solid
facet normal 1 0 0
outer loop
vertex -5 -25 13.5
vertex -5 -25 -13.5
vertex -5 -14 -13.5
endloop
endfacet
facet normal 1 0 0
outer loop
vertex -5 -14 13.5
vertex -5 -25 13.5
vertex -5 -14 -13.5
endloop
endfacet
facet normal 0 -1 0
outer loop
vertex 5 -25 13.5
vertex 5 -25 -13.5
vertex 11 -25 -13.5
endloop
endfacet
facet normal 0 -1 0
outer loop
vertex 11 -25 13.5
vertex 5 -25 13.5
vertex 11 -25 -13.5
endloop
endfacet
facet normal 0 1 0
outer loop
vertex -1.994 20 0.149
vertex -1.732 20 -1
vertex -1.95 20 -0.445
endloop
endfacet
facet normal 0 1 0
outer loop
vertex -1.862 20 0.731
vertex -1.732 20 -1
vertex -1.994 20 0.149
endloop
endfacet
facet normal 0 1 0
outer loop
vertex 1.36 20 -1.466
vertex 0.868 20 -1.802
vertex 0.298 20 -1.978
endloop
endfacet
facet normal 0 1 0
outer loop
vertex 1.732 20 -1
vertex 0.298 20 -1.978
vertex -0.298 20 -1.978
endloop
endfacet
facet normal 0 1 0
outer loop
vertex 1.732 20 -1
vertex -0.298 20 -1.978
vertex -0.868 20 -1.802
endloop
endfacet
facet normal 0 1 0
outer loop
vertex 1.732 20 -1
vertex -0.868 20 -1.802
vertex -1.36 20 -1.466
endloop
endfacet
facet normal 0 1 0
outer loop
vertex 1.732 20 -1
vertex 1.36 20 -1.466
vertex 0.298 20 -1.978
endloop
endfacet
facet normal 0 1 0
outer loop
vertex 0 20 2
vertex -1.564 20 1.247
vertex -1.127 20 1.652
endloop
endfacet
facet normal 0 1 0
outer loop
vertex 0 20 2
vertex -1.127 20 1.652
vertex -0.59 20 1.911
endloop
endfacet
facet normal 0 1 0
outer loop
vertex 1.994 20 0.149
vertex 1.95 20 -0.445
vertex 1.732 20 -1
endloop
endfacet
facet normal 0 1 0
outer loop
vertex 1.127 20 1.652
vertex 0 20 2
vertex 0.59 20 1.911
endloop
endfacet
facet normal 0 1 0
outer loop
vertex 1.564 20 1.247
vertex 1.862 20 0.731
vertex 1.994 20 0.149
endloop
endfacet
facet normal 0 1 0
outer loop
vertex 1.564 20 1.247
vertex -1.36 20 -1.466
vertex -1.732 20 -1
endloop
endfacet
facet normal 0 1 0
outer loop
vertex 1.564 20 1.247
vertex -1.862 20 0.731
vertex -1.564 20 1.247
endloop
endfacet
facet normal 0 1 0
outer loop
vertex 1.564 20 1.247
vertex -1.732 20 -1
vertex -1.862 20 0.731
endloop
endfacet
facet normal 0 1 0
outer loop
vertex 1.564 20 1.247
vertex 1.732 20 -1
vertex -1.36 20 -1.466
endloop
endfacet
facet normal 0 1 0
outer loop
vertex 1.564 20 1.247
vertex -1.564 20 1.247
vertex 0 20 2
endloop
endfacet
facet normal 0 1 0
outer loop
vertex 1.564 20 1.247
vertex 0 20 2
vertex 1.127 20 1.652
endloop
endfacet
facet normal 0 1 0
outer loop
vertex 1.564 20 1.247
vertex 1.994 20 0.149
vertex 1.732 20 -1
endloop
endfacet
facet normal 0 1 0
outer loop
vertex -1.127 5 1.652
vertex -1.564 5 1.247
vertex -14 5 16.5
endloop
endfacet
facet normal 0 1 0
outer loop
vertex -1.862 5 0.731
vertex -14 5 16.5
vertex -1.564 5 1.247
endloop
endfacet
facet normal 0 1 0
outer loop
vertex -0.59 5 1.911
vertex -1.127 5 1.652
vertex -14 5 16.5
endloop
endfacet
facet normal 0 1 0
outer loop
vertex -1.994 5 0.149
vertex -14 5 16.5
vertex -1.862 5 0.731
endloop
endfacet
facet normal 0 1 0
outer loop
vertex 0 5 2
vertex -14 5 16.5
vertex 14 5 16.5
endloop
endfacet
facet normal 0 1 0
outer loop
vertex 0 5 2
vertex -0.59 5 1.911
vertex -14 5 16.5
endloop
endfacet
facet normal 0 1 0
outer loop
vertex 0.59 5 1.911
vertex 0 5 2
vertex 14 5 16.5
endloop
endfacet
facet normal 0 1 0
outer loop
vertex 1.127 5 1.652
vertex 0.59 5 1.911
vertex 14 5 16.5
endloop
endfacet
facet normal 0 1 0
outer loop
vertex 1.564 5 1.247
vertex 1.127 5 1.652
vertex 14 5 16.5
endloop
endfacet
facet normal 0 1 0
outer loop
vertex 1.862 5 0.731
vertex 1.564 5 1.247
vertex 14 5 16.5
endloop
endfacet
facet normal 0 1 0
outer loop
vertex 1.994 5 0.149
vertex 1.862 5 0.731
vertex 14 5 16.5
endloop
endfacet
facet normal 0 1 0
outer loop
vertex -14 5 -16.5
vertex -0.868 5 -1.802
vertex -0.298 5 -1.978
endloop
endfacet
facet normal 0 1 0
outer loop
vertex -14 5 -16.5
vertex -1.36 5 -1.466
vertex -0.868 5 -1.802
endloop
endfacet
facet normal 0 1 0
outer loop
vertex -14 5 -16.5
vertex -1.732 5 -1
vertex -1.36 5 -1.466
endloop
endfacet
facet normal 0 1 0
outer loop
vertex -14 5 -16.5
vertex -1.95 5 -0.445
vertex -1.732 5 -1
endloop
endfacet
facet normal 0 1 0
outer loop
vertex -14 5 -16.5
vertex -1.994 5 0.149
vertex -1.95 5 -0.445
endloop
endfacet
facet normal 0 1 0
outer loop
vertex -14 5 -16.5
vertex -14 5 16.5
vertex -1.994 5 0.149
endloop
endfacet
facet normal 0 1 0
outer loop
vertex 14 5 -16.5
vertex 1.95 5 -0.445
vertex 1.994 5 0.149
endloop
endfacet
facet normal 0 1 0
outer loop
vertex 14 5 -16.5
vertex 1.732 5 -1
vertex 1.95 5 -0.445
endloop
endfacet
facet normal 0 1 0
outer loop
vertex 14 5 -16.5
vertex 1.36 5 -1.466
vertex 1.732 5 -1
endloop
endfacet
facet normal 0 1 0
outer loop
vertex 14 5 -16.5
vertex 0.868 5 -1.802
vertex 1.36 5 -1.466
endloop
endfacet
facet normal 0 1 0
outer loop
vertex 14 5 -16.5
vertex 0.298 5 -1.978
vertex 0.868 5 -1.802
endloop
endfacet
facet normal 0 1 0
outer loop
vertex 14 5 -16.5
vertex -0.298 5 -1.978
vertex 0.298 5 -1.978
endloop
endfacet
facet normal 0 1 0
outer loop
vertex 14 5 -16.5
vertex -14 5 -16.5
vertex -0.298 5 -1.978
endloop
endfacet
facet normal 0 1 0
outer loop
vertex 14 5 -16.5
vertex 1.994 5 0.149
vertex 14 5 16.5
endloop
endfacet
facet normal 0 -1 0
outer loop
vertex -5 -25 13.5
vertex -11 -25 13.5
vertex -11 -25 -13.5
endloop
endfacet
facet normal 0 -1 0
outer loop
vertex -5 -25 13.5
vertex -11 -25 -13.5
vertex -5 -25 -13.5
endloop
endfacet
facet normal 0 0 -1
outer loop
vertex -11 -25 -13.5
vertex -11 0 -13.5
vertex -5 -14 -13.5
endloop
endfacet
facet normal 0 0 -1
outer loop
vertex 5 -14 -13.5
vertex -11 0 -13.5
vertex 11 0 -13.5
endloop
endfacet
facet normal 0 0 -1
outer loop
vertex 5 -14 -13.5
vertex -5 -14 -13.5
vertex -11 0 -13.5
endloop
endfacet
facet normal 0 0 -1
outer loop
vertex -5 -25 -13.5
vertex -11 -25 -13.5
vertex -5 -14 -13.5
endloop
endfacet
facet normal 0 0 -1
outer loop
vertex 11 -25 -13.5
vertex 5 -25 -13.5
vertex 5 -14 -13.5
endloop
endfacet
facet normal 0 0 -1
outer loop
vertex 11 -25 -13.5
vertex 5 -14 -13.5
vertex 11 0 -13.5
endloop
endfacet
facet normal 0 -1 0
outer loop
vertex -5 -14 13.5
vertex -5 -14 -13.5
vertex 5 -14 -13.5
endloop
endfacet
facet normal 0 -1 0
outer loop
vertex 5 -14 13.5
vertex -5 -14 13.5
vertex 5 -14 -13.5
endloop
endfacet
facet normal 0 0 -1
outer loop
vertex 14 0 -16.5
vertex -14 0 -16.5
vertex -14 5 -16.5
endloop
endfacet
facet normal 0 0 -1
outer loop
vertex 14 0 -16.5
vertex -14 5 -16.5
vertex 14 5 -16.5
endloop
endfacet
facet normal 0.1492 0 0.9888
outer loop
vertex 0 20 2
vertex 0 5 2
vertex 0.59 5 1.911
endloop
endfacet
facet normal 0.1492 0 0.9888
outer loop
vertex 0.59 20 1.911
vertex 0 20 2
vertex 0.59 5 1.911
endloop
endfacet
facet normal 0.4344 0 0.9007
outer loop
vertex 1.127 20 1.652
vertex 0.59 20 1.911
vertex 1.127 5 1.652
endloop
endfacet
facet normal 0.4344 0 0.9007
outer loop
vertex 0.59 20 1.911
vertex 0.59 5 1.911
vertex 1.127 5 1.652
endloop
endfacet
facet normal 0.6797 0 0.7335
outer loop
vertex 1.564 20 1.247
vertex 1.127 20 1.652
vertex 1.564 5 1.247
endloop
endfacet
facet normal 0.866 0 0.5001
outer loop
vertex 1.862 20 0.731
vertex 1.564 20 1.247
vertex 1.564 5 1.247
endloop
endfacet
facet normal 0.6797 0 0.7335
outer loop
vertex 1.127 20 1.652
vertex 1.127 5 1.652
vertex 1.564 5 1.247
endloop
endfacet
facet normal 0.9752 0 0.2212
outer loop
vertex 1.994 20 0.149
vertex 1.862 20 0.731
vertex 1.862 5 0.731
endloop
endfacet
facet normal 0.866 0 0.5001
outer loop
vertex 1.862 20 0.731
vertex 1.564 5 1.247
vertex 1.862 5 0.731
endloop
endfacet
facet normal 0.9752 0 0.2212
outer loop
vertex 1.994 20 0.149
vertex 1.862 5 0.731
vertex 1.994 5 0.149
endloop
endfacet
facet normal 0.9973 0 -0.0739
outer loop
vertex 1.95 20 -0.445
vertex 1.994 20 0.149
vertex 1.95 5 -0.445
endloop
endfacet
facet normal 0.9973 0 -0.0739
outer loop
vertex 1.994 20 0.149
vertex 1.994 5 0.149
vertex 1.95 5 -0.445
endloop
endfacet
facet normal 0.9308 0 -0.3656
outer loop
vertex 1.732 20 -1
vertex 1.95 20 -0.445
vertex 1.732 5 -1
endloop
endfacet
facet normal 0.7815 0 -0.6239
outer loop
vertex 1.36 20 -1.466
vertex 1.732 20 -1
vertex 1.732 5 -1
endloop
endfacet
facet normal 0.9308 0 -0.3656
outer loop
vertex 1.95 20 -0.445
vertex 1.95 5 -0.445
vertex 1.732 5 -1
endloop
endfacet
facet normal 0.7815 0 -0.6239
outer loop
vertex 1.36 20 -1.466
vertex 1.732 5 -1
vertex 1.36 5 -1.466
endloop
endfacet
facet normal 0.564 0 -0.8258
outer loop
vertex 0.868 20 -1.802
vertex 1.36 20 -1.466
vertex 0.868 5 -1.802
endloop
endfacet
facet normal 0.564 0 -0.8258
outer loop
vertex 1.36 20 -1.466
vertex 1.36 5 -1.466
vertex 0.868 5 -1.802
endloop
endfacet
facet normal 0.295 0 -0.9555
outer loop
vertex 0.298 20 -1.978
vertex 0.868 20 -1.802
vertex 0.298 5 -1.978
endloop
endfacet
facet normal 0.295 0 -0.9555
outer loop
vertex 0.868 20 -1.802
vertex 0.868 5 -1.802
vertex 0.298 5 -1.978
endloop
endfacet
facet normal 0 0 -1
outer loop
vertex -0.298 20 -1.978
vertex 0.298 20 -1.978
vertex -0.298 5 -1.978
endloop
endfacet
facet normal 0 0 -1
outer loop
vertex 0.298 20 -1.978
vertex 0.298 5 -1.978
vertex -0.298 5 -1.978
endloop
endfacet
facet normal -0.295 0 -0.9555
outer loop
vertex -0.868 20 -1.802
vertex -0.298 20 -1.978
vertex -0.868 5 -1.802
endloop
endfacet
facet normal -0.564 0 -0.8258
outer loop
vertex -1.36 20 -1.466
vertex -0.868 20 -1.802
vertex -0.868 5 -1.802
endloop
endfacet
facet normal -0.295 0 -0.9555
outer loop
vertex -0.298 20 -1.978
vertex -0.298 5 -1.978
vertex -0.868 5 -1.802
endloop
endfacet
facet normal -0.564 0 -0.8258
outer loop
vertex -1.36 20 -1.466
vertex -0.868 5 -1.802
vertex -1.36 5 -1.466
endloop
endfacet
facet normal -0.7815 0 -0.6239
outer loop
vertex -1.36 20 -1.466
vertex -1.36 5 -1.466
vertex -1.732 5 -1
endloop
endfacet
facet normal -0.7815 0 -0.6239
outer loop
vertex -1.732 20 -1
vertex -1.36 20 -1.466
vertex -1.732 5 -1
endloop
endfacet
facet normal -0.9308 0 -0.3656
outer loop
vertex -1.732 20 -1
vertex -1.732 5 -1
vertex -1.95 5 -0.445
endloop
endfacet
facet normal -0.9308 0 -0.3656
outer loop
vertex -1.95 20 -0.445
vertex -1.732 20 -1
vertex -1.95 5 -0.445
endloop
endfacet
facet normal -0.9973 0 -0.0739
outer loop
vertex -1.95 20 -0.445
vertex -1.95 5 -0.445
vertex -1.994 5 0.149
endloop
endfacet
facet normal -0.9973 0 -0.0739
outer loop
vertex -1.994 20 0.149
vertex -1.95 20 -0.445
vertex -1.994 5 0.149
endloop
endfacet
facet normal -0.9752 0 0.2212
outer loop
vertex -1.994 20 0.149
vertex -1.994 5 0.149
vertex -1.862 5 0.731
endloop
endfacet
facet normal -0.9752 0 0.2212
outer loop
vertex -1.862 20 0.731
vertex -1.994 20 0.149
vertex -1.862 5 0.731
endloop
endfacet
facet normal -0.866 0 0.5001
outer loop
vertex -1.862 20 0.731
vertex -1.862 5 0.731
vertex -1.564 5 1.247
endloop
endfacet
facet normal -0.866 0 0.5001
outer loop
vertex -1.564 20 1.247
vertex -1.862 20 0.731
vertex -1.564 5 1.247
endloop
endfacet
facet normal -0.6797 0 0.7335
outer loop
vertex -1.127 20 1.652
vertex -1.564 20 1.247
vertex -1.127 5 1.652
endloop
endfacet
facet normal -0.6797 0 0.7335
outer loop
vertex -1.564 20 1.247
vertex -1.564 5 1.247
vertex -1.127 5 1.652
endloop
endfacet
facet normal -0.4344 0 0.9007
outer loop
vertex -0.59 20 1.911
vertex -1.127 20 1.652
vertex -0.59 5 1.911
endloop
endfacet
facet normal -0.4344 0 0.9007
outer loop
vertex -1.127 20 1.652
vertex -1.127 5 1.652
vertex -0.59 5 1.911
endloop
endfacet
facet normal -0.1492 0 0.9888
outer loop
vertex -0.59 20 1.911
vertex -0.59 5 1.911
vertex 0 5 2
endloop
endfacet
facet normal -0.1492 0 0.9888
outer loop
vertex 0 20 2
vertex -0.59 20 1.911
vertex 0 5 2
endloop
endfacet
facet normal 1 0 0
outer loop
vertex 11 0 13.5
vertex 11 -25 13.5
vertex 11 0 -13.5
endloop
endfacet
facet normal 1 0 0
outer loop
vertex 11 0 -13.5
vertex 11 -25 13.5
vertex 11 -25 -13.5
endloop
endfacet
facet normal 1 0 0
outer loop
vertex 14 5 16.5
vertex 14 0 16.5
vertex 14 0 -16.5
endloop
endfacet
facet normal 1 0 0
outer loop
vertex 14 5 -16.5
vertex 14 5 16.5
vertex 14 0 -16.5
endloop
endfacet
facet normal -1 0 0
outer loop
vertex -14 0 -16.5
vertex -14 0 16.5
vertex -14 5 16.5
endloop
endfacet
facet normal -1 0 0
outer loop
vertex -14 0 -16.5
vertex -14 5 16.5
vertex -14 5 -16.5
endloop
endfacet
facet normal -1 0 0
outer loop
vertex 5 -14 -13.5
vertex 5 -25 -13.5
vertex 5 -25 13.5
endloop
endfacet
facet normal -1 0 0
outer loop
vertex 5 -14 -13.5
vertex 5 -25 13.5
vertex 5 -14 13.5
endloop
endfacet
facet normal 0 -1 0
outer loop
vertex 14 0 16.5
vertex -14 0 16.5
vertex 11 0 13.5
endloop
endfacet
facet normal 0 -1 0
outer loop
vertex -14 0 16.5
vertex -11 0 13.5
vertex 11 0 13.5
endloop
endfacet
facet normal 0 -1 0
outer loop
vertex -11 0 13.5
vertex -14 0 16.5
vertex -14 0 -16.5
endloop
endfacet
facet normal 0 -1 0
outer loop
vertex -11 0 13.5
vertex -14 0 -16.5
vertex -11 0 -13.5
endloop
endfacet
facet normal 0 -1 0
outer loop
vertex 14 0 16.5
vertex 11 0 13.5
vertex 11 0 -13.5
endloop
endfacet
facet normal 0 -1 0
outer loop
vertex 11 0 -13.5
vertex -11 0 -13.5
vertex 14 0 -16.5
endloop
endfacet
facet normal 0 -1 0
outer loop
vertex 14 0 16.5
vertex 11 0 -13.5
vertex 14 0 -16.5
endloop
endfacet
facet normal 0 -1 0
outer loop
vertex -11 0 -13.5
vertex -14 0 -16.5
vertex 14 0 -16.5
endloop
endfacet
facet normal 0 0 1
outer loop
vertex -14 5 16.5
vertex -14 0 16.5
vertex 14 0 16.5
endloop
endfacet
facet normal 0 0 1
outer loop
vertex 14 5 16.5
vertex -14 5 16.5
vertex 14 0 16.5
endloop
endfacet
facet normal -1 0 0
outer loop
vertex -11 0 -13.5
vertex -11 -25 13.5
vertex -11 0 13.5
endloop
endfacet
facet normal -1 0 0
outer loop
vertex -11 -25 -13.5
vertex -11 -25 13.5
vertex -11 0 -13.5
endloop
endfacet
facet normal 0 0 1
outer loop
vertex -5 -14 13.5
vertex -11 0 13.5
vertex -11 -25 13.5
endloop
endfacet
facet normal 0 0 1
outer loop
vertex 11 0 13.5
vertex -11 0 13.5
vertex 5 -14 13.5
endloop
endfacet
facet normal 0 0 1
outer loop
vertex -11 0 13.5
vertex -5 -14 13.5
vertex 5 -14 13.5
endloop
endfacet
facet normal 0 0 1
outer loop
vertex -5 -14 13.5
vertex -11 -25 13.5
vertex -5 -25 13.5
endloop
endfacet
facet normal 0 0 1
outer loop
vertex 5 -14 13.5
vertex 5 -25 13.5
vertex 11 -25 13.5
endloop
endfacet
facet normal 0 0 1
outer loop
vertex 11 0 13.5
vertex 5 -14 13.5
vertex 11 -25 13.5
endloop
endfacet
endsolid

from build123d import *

# Parameters (mm, degrees)
SKETCH1_W               = 28
SKETCH1_H               = 33
FLANGE_DEPTH            = 5
NECK_START              = -14
SKETCH2_W               = 22
SKETCH2_H               = 27
NECK_DEPTH              = 14
PRONGS_START            = -25
SKETCH3_W               = 22
SKETCH3_H               = 27
PRONGS_DEPTH            = 11
SENSING_SLOT_DEPTH      = 34.064331235
SENSING_SLOT_DEPTH_BACK = 34.064331235
SKETCH4_W               = 10
SKETCH4_H               = 12
CABLE_STUB_START        = 5
SKETCH5_R               = 2
CABLE_STUB_DEPTH        = 15


with BuildPart() as part:
    # Sketch1 → Flange (new body)
    with BuildSketch(Plane(origin=(0, 0, 0), x_dir=(1, 0, 0), z_dir=(0, 1, 0))):
        Rectangle(SKETCH1_W, SKETCH1_H)
    extrude(amount=FLANGE_DEPTH)

    # Sketch2 → Neck (add)
    with BuildSketch(Plane(origin=(0, 0, 0), x_dir=(1, 0, 0), z_dir=(0, 1, 0)).offset(NECK_START)):
        Rectangle(SKETCH2_W, SKETCH2_H)
    extrude(amount=NECK_DEPTH)

    # Sketch3 → Prongs (add)
    with BuildSketch(Plane(origin=(0, 0, 0), x_dir=(1, 0, 0), z_dir=(0, 1, 0)).offset(PRONGS_START)):
        Rectangle(SKETCH3_W, SKETCH3_H)
    extrude(amount=PRONGS_DEPTH)

    # Sketch4 → Sensing_Slot (cut, two sides: drawn at the far end of the back side and taken through both)
    with BuildSketch(Plane.XY.offset(-SENSING_SLOT_DEPTH_BACK)):
        with Locations((0, -20)):
            Rectangle(SKETCH4_W, SKETCH4_H)
    extrude(amount=SENSING_SLOT_DEPTH + SENSING_SLOT_DEPTH_BACK, mode=Mode.SUBTRACT)

    # Sketch5 → Cable_Stub (add)
    with BuildSketch(Plane(origin=(0, 0, 0), x_dir=(1, 0, 0), z_dir=(0, 1, 0)).offset(CABLE_STUB_START)):
        with Locations(Location((0, 0, 0), (0, 0, 270))):
            Circle(SKETCH5_R)
    extrude(amount=CABLE_STUB_DEPTH)


solid = part.part
